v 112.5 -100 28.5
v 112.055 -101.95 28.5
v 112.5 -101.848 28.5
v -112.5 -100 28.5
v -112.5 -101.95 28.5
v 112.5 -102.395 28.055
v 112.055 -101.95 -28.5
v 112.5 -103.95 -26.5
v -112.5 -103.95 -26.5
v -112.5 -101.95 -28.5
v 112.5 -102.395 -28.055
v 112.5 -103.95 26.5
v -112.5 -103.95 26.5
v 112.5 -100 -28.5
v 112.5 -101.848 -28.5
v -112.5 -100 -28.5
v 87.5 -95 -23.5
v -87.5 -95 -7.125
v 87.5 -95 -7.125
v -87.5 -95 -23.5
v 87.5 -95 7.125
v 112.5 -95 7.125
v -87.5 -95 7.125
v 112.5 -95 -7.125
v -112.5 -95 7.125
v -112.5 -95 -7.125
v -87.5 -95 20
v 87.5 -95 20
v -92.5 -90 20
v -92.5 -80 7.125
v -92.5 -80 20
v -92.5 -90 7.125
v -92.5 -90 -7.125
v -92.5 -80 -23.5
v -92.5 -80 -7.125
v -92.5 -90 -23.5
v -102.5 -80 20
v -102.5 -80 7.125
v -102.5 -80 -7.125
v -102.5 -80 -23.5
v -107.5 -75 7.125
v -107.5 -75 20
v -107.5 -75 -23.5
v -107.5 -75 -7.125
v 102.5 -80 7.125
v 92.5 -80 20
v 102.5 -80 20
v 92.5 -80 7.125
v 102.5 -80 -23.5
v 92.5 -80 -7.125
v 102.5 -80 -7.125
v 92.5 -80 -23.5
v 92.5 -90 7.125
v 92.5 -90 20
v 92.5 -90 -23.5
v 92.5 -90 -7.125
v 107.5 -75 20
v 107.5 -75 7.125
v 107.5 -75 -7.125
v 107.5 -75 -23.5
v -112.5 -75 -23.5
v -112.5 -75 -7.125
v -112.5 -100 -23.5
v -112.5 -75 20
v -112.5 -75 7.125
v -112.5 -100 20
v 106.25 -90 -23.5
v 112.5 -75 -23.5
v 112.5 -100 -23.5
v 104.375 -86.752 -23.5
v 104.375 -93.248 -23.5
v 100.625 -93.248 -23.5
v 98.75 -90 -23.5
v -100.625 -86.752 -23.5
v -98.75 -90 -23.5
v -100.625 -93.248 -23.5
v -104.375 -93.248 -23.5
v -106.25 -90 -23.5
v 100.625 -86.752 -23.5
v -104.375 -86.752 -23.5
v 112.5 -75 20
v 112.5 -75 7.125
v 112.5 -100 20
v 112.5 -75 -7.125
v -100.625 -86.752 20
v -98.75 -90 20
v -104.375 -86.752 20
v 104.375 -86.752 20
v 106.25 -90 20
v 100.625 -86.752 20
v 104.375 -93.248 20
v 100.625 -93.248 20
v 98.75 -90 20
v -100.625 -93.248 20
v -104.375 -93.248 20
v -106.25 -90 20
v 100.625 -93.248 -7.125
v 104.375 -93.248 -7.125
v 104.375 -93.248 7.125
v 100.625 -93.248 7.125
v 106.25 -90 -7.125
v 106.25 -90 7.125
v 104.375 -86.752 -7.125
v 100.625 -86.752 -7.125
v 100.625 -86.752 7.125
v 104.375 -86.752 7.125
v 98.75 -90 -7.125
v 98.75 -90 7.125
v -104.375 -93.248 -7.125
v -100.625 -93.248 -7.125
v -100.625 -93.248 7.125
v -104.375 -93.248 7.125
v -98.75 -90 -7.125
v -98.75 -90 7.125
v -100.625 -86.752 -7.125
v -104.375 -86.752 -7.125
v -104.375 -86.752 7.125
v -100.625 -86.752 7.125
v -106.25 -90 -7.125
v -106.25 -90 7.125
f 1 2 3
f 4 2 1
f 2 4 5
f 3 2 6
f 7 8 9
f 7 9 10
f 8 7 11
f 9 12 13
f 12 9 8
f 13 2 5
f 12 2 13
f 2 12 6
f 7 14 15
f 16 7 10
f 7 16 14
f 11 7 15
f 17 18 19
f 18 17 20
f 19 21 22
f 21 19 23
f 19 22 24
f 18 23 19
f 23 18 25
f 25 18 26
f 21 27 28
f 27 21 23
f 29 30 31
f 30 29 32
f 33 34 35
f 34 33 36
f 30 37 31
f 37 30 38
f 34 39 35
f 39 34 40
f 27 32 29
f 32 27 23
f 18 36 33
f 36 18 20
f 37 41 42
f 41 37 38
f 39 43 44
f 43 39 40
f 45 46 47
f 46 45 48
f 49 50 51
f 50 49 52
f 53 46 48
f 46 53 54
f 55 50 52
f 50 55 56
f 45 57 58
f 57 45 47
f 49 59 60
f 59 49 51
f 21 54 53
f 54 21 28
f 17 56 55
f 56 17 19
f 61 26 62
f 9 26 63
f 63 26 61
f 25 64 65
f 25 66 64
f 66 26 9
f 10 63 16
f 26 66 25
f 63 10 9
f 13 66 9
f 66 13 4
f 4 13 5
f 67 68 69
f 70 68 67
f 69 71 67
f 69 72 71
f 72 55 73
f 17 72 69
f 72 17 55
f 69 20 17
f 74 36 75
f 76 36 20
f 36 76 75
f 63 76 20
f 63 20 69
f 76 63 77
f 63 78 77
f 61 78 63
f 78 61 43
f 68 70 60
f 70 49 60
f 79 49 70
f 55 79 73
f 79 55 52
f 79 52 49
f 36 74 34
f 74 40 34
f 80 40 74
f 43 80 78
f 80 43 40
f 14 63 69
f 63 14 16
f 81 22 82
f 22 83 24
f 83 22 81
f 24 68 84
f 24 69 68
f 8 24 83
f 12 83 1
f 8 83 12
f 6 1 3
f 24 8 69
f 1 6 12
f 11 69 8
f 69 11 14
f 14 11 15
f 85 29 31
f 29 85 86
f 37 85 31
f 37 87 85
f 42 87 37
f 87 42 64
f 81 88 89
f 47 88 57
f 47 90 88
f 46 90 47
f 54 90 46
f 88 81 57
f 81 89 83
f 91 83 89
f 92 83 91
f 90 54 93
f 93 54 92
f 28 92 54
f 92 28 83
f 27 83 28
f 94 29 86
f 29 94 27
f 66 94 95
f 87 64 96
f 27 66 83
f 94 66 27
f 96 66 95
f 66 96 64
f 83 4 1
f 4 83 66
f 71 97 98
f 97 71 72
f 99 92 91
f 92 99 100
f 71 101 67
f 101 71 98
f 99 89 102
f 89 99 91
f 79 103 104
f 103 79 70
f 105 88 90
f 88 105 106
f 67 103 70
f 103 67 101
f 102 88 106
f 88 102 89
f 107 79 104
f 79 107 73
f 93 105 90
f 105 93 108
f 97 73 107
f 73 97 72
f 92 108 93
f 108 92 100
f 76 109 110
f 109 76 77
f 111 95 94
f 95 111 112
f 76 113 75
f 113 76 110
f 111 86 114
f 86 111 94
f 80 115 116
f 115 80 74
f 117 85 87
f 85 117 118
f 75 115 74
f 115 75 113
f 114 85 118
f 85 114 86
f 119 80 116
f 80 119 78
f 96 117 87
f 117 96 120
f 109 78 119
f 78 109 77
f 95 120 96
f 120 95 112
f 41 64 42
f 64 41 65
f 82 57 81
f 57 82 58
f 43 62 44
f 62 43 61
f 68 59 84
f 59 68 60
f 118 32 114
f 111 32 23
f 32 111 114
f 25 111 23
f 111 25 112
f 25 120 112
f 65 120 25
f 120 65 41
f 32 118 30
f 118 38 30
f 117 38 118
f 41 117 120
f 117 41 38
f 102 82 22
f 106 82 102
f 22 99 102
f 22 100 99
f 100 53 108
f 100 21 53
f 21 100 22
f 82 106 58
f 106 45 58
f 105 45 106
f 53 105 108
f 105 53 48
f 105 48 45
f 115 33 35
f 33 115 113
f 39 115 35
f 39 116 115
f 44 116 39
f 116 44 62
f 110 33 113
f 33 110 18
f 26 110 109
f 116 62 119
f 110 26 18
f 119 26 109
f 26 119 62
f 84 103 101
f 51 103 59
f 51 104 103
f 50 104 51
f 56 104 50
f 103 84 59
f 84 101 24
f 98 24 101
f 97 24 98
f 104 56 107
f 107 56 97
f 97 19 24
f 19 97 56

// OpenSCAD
// file: frame-left.scad
/*
 * SPDX-FileCopyrightText: © 2023 Brian S. Stephan <bss@incorporeal.org>
 * SPDX-License-Identifier: GPL-3.0-or-later
 */

include <parameters.scad>
include <components.scad>

module base_left_frame(lower=false) {
	difference() {
		frame(lower=lower);
		// chop the right edge off
		side_chopper();
	}
}

module left_frame(lower=false) {
	difference() {
		base_left_frame(lower=lower);
		// connection holes to other frames
		frame_connection_holes();

		// cable routing hole
		frame_cable_routing_hole();

		// aux button holes
		translate([-35, 101.5, 0]) rotate([270, 0, 0]) aux_control_three_button_cluster();
		translate([-35, (frame_y/2)-neutrik_panel_thickness-4, 0]) frame_cutout();
		translate([-72, (frame_y/2)-neutrik_panel_thickness-4, 0]) frame_cutout();
		translate([2, (frame_y/2)-neutrik_panel_thickness-4, 0]) frame_cutout();

		// neutrix button hole
		translate([frame_center_to_neutrik, (frame_y/2)-neutrik_panel_thickness, 0])
			rotate([90, 0, 0]) neutrik_d_mount();
		translate([frame_center_to_neutrik, (frame_y/2)-neutrik_panel_thickness-4, 0])
			frame_cutout();
	}
}

left_frame();
// file: parameters.scad
/*
 * SPDX-FileCopyrightText: © 2023 Brian S. Stephan <bss@incorporeal.org>
 * SPDX-License-Identifier: GPL-3.0-or-later
 */

// adjustments
hole_tolerance = 0.15;

// M2
m2_screw_selftap_radius = 0.95;

// M3
m3_screw_selftap_radius = 1.3;

// M4
m4_bolt_radius = 2 + hole_tolerance;
m4_bolt_countersink_radius = 6.1 + hole_tolerance;
m4_bolt_hex_exterior_radius = 3.6 + hole_tolerance;

// 24mm button
small_button_radius = 12 + hole_tolerance;

// 30mm button
big_button_radius = 15 + hole_tolerance;

// JLF mount dimensions
lever_mount_x = 53;
lever_mount_y = 95;
lever_mount_z = 2;

// standard lever hole
lever_plate_hole = 12;

// korean lever hole
korean_lever_plate_hole = 17.6;

// case dimensions
// base frame box. reminder: top of inside (including mounts) is chopped by panel_z for plates
frame_x = 233;
frame_y = 208;
frame_z = 57;

// degree to which the extended frame pieces stick out from the end of the frame
frame_extension_x = 25;
frame_extension_y = 25;

// this sinks the bottom and top of the frame inward a bit, and is used to math out two shapes
// when creating the frame box / overhang panel
frame_bevel_height = 2;
overhang_panel_bevel_height = 1;

frame_center_to_neutrik = 70;

// depth of the "lip" of the frame that the top plate sets into/supports the overhang
frame_wall = 4;

// width of the column in the frame corners to support the hex bolt
frame_mount_column_width = 20;

// per neutrik (mm)
neutrik_panel_thickness = 3;

// top plate, which can either be the whole plate ("inset") or the mounting frame for a plate that overhangs
panel_x = frame_x - (frame_wall * 2);
panel_y = frame_y - (frame_wall * 2);
panel_z = 5;

// how much the top plate x/y is expanded to overhang the frame
// note that this is relative to the top plate (so the wall is added back)
panel_overhang_amount = 8.5;
overhang_panel_x = panel_x + (frame_wall * 2) + (panel_overhang_amount * 2);
overhang_panel_y = panel_y + (frame_wall * 2) + (panel_overhang_amount * 2);

panel_to_frame_point_x = (panel_x/2)-10;
panel_to_frame_point_y = (panel_y/2)-10;

// frame interior that supports the top plates
panel_support_width = 5;

// neutrik D screw holes
neutrik_d_screw_radius = 1.6 + hole_tolerance;
neutrik_d_radius = 12 + hole_tolerance;

// GX 16 holes
gx16_radius = 7.8 + hole_tolerance;

// additional button radius for decorative panels, etc.
decorative_radius_scale = 1.75;
jumbo_decorative_radius_scale = 2;
// file: frame-piece-bottom-left-or-right.scad
/*
 * SPDX-FileCopyrightText: © 2024 Brian S. Stephan <bss@incorporeal.org>
 * SPDX-License-Identifier: GPL-3.0-or-later
 */

include <parameters.scad>
include <components.scad>
use <frame-left.scad>

module bottom_left_or_right_frame_piece(lower=false) {
	piece_width = panel_support_width+frame_wall+frame_mount_column_width;
	intersection() {
		left_frame(lower=lower);
		difference() {
			// include the whole bottom wall (including mount columns)
			translate([0, -(frame_y/2)+(piece_width/2), 0]) cube([frame_x, piece_width, frame_z], center=true);
			// ...minus the frame wall and lip on the left
			translate([-frame_x/2+frame_wall/2, 0, 0])
				cube([frame_wall, frame_y, frame_z], center=true);
			// ...minus a slot for the combining piece to go into
			cube([frame_x, frame_y-(panel_support_width+frame_wall)*2, frame_z/4], center=true);
		}
	}
}

bottom_left_or_right_frame_piece();
// main file
/*
 * SPDX-FileCopyrightText: © 2023 Brian S. Stephan <bss@incorporeal.org>
 * SPDX-FileCopyrightText: © 2023 Luis Sebastián <buran@silosneeded.com>
 * SPDX-License-Identifier: GPL-3.0-or-later
 */

use <frame-piece-bottom-left-or-right.scad>

bottom_left_or_right_frame_piece(lower=true);
